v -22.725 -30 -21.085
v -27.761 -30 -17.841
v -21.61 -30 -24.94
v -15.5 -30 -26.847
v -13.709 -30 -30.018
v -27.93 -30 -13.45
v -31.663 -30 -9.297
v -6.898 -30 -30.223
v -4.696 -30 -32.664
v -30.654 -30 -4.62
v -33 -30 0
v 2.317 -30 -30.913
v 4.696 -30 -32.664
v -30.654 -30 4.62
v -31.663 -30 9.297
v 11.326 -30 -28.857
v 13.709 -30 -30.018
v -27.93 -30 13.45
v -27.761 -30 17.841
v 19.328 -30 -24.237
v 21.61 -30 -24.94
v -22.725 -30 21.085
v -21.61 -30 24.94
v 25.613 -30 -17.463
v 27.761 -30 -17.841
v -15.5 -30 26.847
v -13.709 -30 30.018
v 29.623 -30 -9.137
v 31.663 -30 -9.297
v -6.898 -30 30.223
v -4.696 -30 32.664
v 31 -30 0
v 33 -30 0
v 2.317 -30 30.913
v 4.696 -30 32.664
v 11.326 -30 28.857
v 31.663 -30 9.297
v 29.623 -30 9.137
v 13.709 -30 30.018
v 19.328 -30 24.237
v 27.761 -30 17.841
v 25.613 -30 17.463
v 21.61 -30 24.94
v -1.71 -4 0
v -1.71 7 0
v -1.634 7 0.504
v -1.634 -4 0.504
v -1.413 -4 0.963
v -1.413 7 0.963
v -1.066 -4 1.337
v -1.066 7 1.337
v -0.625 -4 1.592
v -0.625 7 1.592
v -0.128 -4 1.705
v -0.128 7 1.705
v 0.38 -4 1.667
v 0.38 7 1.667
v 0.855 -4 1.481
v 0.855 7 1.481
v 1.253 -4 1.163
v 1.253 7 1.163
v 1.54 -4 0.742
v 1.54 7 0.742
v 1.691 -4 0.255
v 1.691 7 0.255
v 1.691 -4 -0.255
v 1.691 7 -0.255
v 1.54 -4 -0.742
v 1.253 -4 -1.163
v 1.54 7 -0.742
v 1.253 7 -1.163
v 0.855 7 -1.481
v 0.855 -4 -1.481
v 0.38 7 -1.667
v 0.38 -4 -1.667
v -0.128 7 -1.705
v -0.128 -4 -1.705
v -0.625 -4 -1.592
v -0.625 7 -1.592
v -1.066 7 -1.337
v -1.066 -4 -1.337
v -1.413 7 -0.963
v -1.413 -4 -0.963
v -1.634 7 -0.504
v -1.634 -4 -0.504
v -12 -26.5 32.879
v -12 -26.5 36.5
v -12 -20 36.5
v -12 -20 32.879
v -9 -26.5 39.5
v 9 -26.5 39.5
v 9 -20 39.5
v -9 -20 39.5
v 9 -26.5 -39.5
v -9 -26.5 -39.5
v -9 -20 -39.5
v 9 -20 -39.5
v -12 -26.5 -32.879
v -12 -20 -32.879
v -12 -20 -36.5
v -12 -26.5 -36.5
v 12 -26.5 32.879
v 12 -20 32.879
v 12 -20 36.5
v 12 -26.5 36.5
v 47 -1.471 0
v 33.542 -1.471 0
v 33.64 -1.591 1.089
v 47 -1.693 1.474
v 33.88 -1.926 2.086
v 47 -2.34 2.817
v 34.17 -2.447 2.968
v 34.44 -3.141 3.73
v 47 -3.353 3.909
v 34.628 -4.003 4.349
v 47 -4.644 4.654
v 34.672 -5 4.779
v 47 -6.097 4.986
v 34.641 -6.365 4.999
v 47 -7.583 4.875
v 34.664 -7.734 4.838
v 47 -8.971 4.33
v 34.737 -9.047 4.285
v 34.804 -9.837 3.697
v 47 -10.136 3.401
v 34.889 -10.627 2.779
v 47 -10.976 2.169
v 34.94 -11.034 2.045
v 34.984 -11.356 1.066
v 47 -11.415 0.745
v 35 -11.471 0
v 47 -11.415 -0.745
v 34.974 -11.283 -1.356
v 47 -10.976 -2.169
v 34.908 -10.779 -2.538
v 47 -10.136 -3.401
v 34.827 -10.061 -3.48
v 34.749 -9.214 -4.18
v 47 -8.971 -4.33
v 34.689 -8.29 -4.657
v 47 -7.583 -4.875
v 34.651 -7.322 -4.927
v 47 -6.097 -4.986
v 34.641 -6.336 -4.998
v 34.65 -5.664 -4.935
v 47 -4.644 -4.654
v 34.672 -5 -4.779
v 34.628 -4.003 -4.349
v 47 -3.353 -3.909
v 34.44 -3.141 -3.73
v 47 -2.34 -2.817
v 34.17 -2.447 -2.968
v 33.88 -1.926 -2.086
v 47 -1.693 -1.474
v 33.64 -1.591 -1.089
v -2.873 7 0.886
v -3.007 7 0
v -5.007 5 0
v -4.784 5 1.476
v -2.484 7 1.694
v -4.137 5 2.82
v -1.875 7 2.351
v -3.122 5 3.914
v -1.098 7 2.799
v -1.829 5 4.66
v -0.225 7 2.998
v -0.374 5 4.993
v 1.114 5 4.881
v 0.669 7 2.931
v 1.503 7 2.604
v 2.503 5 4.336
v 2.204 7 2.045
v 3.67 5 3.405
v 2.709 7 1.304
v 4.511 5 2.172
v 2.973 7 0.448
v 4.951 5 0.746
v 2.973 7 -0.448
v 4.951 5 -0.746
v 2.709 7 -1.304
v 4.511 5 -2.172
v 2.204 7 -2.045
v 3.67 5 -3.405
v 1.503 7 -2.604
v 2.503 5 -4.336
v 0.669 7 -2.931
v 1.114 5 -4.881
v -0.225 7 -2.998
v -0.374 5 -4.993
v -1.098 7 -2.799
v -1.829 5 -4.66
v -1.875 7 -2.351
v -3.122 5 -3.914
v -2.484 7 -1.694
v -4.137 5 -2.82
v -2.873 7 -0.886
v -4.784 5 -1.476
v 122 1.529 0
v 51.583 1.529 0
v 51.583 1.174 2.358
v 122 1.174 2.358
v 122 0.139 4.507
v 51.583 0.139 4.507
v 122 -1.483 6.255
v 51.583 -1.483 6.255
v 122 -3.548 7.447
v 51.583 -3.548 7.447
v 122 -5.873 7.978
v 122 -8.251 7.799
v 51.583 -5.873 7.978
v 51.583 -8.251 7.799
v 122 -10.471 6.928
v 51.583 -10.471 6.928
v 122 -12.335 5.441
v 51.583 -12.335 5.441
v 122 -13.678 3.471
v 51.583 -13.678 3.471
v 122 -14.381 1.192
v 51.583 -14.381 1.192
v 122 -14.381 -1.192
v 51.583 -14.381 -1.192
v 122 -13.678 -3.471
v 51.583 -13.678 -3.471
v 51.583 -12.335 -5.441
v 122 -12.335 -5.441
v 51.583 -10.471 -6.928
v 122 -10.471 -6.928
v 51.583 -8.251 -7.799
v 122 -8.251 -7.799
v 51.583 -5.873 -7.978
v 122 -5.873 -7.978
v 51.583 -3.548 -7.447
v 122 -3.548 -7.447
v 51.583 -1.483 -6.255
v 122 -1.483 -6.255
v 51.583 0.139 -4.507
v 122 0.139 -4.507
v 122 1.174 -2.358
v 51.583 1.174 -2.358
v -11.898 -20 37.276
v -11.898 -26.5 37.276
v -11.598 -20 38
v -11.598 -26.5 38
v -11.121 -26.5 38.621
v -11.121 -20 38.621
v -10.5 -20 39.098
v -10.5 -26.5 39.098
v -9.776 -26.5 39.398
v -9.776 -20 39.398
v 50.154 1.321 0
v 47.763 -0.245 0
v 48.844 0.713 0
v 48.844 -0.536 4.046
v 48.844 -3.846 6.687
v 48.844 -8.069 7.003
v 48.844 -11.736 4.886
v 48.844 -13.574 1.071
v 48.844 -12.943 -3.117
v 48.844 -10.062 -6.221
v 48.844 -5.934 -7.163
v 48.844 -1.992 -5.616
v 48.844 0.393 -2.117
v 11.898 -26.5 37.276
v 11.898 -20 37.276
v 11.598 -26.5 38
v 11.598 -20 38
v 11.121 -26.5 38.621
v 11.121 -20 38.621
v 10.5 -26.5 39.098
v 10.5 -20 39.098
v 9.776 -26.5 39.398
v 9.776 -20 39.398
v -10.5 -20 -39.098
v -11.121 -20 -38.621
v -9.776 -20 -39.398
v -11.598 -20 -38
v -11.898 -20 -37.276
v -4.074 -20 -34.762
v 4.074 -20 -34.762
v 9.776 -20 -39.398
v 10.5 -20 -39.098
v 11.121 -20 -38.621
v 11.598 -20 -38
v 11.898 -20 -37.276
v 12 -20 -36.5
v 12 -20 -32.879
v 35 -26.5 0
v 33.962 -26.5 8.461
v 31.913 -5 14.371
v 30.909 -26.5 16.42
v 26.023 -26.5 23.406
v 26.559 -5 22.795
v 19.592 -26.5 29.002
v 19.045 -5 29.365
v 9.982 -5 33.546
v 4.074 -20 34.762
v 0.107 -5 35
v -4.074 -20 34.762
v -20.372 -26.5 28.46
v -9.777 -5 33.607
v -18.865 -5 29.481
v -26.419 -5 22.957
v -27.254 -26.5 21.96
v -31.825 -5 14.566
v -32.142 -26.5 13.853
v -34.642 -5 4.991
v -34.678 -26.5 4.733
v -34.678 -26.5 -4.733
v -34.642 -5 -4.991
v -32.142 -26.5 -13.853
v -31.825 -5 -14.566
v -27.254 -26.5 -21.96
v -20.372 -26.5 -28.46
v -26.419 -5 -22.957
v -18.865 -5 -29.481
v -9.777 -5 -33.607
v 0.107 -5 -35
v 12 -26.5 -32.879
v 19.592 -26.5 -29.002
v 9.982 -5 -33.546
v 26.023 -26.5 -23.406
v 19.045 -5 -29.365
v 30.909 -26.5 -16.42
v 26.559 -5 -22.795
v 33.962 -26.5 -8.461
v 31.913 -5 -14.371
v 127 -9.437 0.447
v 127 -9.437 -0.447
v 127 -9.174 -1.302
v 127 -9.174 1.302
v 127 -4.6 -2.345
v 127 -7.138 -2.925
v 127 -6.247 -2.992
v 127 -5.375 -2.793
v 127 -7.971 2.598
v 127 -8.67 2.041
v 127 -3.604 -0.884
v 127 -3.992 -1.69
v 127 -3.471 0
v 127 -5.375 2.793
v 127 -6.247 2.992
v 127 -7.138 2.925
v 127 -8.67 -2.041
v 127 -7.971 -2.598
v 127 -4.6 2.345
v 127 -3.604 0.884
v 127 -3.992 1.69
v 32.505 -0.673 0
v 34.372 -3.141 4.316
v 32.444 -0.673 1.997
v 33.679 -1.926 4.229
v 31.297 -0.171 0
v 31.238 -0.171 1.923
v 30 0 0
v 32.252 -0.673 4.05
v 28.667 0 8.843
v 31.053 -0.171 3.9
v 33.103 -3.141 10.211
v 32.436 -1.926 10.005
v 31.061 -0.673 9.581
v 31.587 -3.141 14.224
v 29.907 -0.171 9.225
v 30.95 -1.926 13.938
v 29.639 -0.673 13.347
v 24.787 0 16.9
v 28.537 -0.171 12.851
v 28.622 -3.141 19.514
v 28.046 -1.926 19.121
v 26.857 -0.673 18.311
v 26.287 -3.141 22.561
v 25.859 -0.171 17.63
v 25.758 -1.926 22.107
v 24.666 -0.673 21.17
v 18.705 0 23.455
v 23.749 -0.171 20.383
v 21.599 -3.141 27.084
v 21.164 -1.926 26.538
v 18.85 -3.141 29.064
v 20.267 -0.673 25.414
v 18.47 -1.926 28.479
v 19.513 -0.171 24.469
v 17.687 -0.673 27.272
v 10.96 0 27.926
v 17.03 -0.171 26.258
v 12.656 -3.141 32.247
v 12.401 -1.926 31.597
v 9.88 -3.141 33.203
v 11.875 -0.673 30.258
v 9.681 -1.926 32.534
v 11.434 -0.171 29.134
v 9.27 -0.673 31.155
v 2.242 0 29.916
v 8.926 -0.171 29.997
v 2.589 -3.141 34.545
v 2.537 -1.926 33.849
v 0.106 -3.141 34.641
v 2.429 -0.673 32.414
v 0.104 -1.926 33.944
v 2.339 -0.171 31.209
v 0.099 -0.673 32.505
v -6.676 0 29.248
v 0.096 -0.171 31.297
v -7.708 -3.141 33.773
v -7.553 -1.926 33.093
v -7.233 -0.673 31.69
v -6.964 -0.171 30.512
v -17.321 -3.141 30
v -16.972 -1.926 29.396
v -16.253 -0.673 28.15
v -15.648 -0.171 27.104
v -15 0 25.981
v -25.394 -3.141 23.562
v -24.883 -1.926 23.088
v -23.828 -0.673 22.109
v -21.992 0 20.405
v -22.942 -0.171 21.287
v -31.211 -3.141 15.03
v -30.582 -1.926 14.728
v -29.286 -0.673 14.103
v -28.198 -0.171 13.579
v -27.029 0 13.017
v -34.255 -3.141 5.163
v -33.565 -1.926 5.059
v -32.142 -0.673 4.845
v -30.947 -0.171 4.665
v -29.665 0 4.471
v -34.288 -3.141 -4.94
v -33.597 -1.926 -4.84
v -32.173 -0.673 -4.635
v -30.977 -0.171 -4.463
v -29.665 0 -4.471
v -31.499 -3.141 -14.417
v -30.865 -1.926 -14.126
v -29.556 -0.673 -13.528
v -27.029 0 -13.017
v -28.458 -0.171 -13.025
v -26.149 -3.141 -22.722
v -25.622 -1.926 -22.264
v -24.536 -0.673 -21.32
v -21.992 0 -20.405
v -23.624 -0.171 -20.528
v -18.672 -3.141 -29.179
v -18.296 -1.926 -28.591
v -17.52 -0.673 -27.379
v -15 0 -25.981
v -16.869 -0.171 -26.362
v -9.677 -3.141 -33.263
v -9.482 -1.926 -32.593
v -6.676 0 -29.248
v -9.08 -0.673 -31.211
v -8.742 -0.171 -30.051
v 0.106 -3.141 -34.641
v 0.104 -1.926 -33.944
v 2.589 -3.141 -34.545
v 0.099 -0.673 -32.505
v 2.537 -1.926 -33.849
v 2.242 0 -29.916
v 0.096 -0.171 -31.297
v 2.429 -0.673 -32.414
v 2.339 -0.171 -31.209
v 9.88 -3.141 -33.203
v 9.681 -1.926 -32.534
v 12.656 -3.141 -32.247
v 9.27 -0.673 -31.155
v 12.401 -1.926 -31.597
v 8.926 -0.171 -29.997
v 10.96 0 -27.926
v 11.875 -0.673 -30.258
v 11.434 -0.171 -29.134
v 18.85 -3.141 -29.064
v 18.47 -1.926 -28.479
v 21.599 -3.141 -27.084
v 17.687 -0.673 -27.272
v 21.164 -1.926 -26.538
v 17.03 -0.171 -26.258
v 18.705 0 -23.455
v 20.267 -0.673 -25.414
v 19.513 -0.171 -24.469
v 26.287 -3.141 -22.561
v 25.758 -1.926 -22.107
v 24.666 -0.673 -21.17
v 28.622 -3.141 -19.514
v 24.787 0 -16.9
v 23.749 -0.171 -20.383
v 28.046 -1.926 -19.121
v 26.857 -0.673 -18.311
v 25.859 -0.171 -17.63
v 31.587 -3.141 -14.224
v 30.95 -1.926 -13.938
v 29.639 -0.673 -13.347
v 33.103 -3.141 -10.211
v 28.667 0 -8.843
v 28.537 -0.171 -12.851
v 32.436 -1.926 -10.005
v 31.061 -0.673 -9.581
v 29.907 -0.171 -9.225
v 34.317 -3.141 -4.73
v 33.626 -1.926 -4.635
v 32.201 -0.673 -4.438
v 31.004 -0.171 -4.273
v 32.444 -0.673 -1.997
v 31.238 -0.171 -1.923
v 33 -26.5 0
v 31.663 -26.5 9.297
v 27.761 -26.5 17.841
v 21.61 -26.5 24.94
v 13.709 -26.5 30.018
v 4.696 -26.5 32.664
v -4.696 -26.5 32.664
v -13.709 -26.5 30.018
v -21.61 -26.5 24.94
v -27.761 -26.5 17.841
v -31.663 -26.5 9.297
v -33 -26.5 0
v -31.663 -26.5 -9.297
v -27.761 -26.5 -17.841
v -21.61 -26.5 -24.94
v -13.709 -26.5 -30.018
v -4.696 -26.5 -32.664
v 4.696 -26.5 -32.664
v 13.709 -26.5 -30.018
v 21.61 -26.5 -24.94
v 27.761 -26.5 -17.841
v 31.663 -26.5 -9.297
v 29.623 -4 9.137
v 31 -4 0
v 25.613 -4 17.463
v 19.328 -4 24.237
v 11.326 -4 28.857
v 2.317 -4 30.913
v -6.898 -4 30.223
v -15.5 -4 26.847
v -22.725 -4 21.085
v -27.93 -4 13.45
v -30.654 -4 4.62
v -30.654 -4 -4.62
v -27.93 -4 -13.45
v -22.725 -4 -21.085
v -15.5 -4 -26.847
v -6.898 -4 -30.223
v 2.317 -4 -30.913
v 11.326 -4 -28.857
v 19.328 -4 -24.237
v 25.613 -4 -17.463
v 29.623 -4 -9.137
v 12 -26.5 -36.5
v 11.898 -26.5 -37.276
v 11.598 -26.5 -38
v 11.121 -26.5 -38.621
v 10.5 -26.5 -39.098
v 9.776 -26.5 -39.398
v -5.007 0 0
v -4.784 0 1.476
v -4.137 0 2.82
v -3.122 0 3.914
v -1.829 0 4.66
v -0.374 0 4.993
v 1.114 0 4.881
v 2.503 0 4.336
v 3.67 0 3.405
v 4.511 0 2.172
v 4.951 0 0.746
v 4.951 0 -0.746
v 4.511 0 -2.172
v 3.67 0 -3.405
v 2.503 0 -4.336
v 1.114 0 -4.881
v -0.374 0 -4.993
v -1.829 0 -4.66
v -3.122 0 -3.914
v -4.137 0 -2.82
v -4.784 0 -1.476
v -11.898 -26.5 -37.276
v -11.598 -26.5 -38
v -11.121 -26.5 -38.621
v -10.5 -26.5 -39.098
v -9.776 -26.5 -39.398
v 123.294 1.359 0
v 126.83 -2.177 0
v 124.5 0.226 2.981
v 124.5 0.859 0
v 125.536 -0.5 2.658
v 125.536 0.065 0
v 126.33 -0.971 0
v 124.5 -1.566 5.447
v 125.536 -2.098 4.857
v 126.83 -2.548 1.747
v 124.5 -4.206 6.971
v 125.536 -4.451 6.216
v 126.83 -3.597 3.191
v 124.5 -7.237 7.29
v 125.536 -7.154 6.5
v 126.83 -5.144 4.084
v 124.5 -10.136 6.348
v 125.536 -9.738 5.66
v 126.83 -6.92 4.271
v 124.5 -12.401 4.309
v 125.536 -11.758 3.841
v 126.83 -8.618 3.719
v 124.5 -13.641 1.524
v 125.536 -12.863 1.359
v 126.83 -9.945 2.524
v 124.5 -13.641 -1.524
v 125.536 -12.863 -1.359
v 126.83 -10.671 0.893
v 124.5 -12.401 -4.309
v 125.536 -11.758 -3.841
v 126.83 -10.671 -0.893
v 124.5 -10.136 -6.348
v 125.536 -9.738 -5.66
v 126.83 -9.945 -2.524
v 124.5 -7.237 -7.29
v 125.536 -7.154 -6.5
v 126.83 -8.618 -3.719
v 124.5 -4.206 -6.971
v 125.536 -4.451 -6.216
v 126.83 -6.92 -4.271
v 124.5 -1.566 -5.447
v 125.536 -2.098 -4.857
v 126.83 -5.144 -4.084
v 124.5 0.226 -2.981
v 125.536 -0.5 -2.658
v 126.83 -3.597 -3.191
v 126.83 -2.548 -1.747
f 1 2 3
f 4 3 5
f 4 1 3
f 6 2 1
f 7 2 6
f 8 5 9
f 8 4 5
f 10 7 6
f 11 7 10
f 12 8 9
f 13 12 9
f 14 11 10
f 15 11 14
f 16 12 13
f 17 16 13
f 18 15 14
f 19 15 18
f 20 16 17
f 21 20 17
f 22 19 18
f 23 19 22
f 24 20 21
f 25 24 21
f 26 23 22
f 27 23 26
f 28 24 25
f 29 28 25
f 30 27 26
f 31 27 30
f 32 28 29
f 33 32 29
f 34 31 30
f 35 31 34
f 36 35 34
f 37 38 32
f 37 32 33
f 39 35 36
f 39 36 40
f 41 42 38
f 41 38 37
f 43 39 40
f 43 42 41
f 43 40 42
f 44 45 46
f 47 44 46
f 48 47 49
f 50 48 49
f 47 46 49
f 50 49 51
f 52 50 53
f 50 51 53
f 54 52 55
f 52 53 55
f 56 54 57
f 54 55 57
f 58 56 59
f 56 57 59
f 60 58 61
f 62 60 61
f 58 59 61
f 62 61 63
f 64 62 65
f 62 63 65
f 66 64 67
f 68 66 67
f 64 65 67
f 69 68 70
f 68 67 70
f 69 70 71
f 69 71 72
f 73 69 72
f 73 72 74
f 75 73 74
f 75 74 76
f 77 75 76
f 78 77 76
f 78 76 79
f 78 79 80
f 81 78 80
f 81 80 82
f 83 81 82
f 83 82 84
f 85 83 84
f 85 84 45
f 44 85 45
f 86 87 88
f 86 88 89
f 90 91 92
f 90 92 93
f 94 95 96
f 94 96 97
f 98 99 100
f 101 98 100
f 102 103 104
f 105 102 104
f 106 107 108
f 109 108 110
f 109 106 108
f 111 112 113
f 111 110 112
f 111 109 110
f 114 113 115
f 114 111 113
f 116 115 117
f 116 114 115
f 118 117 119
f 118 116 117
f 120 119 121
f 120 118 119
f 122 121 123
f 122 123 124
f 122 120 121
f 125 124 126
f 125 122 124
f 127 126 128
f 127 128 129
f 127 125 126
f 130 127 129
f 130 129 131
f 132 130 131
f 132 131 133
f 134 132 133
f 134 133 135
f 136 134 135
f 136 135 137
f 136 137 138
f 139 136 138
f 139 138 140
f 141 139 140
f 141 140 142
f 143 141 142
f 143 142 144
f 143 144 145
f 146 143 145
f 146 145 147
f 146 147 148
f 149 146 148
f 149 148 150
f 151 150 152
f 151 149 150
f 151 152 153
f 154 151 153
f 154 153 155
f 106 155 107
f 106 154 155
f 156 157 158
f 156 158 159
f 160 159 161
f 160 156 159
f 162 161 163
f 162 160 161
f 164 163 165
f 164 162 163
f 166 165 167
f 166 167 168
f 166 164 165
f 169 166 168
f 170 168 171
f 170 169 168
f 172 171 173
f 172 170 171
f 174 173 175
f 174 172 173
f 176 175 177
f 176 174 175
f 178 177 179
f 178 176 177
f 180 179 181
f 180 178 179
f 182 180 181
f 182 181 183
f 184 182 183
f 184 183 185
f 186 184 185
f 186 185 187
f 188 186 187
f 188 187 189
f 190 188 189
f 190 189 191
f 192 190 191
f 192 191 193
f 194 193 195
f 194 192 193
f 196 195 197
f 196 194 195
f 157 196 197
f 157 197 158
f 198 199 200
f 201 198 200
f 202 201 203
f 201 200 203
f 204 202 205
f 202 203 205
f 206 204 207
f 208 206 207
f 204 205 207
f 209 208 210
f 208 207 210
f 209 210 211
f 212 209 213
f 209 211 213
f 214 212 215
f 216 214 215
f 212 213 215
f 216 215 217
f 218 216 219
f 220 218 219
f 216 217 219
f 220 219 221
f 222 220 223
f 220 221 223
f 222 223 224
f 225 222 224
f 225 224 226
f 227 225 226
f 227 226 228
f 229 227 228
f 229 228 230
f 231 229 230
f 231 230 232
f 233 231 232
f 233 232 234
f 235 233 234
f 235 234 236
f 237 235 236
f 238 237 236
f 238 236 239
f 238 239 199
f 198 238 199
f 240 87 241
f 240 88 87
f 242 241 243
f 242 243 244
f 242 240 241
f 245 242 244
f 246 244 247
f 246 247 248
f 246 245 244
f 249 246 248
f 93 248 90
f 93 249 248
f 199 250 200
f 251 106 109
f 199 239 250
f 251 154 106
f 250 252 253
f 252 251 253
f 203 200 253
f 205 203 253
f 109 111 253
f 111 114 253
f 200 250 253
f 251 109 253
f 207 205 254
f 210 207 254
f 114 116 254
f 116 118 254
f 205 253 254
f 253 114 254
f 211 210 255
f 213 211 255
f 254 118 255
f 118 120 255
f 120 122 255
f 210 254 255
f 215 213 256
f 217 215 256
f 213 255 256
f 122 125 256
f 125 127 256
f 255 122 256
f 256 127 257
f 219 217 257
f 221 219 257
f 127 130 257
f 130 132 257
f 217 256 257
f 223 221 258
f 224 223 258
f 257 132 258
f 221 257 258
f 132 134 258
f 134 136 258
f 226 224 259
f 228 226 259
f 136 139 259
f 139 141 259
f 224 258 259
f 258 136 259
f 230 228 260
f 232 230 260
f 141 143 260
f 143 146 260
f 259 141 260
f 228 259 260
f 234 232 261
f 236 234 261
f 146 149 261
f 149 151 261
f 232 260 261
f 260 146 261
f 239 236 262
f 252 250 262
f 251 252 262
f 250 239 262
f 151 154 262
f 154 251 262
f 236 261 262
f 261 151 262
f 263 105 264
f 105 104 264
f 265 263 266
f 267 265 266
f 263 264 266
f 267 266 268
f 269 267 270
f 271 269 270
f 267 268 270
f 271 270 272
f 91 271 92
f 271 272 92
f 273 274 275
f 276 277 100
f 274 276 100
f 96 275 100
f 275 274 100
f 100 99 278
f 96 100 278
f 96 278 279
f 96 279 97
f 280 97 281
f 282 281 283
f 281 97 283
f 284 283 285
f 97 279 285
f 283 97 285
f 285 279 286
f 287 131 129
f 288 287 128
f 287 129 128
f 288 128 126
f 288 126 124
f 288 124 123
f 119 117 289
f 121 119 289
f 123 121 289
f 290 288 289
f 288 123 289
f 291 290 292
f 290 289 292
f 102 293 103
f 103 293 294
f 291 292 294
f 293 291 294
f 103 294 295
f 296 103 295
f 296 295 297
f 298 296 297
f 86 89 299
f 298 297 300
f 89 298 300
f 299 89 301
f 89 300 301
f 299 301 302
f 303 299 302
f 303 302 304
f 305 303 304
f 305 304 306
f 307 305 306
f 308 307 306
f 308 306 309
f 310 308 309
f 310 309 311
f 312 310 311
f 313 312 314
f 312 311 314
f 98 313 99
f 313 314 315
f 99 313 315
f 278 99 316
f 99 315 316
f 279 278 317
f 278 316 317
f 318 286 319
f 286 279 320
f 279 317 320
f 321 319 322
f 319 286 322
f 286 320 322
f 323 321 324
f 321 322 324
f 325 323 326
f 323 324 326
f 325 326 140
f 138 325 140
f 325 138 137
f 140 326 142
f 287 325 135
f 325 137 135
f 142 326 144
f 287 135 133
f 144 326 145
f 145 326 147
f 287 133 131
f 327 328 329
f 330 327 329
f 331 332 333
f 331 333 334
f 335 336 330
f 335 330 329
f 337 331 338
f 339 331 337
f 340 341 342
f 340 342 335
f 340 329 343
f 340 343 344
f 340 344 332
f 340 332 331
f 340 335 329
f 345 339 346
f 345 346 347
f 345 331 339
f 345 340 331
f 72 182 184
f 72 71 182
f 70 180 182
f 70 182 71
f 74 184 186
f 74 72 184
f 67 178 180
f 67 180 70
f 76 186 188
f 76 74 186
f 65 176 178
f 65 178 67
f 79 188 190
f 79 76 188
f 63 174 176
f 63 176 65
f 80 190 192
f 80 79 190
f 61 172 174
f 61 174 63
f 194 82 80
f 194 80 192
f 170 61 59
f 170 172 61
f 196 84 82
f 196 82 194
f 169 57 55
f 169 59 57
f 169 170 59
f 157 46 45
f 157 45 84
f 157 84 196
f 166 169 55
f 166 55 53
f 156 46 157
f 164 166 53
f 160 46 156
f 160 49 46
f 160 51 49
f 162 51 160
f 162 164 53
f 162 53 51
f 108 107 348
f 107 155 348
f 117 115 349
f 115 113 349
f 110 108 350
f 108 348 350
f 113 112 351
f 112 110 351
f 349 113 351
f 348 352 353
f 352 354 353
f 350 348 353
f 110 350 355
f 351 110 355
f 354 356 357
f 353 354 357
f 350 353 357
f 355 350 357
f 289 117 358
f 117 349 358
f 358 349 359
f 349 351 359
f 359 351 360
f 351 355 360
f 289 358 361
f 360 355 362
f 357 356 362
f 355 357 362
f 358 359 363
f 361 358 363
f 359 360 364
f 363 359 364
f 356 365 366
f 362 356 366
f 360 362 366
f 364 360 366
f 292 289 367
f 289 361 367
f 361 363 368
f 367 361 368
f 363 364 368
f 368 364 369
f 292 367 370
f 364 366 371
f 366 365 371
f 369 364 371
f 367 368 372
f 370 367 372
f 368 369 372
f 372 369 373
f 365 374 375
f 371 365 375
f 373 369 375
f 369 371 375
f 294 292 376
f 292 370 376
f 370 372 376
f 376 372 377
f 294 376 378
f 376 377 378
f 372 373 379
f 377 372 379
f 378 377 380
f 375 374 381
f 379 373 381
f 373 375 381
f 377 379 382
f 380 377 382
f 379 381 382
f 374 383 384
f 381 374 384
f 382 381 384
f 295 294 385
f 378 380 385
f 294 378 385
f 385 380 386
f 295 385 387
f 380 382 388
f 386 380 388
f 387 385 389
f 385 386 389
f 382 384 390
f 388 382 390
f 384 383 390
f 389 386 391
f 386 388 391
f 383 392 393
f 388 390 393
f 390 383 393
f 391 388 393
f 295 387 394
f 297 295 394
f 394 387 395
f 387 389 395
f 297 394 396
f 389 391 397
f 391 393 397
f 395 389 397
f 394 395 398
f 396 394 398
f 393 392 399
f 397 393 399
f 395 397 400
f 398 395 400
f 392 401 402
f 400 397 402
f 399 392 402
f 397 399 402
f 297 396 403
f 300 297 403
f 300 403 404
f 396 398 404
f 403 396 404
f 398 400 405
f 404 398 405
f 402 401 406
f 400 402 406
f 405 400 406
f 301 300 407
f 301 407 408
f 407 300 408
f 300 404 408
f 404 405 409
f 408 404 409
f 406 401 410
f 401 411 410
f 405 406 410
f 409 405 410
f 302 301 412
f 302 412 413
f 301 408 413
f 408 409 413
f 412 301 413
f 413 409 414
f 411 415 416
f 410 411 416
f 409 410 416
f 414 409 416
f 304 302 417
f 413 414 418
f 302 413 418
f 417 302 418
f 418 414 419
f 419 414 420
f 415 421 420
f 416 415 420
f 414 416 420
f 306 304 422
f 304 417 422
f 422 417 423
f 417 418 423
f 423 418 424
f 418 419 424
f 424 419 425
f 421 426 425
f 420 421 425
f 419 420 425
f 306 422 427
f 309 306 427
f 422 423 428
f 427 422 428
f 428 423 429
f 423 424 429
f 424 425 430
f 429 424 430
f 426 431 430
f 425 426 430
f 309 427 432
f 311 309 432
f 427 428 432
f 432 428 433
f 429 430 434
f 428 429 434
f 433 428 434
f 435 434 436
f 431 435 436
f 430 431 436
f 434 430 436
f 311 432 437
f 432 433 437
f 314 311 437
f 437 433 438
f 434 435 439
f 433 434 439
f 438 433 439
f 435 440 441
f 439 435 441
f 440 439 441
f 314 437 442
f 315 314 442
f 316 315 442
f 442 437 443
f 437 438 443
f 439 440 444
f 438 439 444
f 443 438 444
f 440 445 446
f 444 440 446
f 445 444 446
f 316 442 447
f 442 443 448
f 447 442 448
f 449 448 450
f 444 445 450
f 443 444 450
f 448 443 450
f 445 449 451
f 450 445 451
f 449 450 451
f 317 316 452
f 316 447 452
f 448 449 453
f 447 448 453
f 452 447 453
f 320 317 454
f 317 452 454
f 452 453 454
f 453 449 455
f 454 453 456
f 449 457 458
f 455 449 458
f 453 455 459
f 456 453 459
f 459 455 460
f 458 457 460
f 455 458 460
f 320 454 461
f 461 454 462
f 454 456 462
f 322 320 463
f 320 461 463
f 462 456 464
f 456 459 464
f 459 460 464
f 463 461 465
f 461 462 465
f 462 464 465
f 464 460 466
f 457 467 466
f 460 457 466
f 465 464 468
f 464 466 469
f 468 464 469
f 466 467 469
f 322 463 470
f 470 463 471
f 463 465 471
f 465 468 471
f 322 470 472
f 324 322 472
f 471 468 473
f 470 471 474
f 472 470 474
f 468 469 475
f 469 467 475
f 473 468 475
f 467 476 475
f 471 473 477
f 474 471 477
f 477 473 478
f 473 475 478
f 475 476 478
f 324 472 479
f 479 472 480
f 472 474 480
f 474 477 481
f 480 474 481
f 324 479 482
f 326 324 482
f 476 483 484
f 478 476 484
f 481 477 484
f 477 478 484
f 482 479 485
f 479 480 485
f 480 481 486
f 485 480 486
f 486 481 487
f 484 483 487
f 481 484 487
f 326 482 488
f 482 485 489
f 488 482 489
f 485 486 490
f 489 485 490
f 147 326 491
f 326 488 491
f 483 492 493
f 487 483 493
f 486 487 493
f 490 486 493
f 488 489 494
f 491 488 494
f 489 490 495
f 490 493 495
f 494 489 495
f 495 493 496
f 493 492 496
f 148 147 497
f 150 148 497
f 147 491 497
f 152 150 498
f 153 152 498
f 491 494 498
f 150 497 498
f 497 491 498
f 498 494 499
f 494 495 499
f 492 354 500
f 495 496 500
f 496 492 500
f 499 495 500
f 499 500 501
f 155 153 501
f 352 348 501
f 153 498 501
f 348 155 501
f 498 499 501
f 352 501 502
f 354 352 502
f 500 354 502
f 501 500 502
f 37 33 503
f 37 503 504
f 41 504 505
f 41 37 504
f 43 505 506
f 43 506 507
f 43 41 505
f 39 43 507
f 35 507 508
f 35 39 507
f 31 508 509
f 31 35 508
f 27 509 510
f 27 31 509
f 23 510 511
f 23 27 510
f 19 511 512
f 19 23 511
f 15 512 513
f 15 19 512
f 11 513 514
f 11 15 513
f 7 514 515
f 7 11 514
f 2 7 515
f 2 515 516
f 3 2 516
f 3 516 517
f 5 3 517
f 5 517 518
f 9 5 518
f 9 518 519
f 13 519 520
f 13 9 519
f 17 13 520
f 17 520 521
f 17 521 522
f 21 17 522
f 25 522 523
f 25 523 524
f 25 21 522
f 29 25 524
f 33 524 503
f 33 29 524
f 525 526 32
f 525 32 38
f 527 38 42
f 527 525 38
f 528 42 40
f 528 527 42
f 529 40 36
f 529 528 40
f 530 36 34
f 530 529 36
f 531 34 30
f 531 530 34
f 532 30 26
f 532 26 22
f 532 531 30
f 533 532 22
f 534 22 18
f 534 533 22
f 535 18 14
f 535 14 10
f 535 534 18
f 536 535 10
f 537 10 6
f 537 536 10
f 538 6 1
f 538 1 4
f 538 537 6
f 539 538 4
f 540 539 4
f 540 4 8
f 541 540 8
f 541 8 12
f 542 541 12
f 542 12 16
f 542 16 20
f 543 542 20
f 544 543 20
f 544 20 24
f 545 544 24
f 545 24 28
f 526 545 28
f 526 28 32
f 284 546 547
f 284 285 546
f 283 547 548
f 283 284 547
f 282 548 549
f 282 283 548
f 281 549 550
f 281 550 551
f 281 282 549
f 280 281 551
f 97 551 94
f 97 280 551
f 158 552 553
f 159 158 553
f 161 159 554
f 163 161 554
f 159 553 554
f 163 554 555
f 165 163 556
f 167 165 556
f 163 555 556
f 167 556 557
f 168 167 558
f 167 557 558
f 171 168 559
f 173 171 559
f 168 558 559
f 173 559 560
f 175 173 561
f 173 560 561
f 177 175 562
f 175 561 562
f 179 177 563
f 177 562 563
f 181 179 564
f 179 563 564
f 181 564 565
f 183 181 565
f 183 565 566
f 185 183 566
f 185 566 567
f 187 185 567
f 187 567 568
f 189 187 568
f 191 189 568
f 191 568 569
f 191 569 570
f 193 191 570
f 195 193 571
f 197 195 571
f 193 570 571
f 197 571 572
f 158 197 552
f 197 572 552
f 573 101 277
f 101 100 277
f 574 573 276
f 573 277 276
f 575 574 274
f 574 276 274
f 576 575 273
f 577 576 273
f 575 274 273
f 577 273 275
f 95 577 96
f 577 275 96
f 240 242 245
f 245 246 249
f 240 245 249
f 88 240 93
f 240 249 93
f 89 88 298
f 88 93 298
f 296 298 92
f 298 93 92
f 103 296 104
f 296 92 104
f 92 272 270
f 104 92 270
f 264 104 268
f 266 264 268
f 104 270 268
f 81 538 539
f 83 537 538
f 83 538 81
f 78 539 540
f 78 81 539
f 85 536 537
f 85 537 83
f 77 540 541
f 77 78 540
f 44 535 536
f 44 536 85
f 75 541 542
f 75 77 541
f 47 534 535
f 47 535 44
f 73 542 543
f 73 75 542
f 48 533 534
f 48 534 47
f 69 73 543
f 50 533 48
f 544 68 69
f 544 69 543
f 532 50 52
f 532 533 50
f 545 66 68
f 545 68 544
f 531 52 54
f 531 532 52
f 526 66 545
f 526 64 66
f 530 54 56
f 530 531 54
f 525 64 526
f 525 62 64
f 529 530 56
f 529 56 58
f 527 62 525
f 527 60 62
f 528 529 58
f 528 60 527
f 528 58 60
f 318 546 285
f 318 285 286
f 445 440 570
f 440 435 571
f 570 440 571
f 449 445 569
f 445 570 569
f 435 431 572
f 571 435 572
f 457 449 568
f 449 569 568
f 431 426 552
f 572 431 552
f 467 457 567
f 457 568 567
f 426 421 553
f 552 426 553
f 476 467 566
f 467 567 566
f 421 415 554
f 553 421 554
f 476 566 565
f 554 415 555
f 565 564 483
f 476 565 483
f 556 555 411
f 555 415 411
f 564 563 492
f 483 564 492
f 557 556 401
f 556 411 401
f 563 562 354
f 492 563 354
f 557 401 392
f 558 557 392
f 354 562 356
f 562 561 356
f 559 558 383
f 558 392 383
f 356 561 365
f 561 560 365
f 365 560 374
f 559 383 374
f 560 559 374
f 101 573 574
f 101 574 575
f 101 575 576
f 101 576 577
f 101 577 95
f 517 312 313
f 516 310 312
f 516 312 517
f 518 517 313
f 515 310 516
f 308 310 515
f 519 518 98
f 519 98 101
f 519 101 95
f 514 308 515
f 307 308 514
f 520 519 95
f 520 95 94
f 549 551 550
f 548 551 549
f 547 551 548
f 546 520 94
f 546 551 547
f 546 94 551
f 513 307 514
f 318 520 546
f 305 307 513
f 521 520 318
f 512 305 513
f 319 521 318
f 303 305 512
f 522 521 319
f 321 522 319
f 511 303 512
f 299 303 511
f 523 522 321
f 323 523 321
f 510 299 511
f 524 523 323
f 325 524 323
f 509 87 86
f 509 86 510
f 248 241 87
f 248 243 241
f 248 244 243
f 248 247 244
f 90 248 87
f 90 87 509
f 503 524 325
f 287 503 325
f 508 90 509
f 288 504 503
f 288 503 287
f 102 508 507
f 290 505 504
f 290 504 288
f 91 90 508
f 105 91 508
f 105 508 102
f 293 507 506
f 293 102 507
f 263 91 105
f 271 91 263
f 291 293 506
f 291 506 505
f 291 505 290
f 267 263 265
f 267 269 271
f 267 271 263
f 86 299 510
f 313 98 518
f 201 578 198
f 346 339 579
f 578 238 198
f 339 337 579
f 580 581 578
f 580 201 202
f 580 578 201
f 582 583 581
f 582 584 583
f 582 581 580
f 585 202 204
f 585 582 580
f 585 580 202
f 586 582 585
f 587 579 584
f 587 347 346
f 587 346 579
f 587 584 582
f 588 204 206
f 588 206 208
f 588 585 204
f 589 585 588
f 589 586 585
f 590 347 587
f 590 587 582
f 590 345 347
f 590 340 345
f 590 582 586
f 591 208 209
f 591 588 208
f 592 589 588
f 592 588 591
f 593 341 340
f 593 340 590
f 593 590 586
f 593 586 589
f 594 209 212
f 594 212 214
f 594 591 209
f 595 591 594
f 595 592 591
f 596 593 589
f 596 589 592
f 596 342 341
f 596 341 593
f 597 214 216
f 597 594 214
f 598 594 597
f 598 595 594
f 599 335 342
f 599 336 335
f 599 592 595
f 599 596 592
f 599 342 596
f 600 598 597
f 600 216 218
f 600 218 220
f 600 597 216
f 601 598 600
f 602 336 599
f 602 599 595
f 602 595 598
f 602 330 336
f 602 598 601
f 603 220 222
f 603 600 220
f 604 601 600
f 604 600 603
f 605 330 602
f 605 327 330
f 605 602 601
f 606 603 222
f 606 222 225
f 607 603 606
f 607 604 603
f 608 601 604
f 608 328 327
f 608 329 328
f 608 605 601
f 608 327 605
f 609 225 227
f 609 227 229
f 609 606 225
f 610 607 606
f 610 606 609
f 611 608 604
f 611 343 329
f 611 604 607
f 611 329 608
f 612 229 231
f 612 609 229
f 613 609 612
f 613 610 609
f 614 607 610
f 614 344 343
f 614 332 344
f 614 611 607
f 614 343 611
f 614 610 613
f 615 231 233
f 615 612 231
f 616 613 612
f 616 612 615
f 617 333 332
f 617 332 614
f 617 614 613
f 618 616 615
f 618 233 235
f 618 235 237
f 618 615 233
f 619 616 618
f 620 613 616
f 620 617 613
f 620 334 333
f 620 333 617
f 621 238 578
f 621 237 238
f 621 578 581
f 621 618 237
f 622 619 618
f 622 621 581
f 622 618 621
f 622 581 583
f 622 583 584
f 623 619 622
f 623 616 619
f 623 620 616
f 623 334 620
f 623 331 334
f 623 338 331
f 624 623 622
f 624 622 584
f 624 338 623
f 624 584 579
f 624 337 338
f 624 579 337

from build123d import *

# Parameters (mm, degrees)
F0_R      = 35
F1_DEPTH  = 30
F2_T      = -4
F3_R      = 5
F5_R      = 5
F7_R      = 8
F7_R_2    = 5
F8_DEPTH  = 80
F9_R      = 5.0065220345
F10_DEPTH = 7
F11_SIZE  = 2
F14_DEPTH = 6.5
F15_R     = 5
F17_R     = 35
F17_R_2   = 33
F18_DEPTH = 3.5
F19_R     = 3
F20_R     = 1.7097163671
F21_DEPTH = 37.001


# Not quite as in the source:
# - a fillet or chamfer that OpenCascade refuses, or shapes differently, is made with other operations: its cross-section is extruded or revolved along the edge and cut away or added


with BuildPart() as f1:
    # F0 (on Front) → F1 (new body)
    with BuildSketch(Plane.XZ):
        Circle(F0_R)
    extrude(amount=F1_DEPTH)

    # F2
    f2_openings = [f1.faces().sort_by_distance(p)[0] for p in [
        (0, -30, 0),
    ]]
    offset(amount=F2_T, openings=f2_openings)

    # F3
    f3_edges = [f1.edges().sort_by_distance(p)[0] for p in [
        (-35, 0, 0),
    ]]
    fillet(f3_edges, radius=F3_R)

    # F5 (on offset) → F6 (join, up to the next surface of F1)
    with BuildSketch(Plane.YZ.offset(47)):
        with Locations((-6.4707305679, 0)):
            Circle(F5_R)
    extrude(until=Until.NEXT, dir=(-1, 0, 0))

    # F7 (on face) → F8 (join)
    with BuildSketch(Plane.YZ.offset(47)):
        with Locations((-6.4707305679, 0)):
            Circle(F7_R)
        with Locations((-6.4707305679, 0)):
            Circle(F7_R_2, mode=Mode.SUBTRACT)
        with Locations((-6.4707305679, 0)):
            Circle(F7_R_2)
    extrude(amount=F8_DEPTH)

    # F9 (on face) → F10 (join)
    with BuildSketch(Plane(origin=(0, 0, 0), x_dir=(-1, 0, 0), z_dir=(0, 1, 0))):
        Circle(F9_R)
    extrude(amount=F10_DEPTH)

    # F11
    f11_edges = [f1.edges().sort_by_distance(p)[0] for p in [
        (5.006522, 7, 0),
    ]]
    chamfer(f11_edges, length=F11_SIZE)

    # F13 (on offset) → F14 (join)
    with BuildSketch(Plane.XZ.offset(26.5)):
        with BuildLine():
            Line((-12, -39.5), (12, -39.5))
            Line((12, -39.5), (12, -32.8785644455))
            ThreePointArc((12, -32.8785644455), (0, -35), (-12, -32.8785644455))
            Line((-12, -32.8785644455), (-12, -39.5))
        make_face()
        with BuildLine():
            ThreePointArc((-12, 32.8785644455), (0, 35), (12, 32.8785644455))
            Line((12, 32.8785644455), (12, 39.5))
            Line((12, 39.5), (-12, 39.5))
            Line((-12, 39.5), (-12, 32.8785644455))
        make_face()
    extrude(amount=-F14_DEPTH)

    # F15
    f15_edges = [f1.edges().sort_by_distance(p)[0] for p in [
        (127, -14.470731, 0),
    ]]
    fillet(f15_edges, radius=F15_R)

    # F16: fillet of radius 5 on 1 edges, made by hand

    # F16_s1 → F16_t2 (revolve, cut)
    with BuildSketch(Plane.XY):
        with BuildLine():
            ThreePointArc((51.582575695, 1.5292694321), (48.8439629074, 0.7125695648), (47, -1.4707305679))
            Line((47, -1.4707305679), (47, 1.5292694321))
            Line((47, 1.5292694321), (51.582575695, 1.5292694321))
        make_face()
    revolve(axis=Axis((47, -6.4707305679, 0), (1, 0, 0)), mode=Mode.SUBTRACT)

    # F17 (on face) → F18 (cut, through all)
    with BuildSketch(Plane.XZ.offset(30)):
        Circle(F17_R)
        Circle(F17_R_2, mode=Mode.SUBTRACT)
    extrude(amount=-F18_DEPTH, mode=Mode.SUBTRACT)

    # F19
    f19_edges = [f1.edges().sort_by_distance(p)[0] for p in [
        (12, -23.25, 39.5),
        (-12, -23.25, 39.5),
        (-12, -23.25, -39.5),
        (12, -23.25, -39.5),
    ]]
    fillet(f19_edges, radius=F19_R)

    # F20 (on face) → F21 (cut, through all)
    with BuildSketch(Plane(origin=(0, 7, 0), x_dir=(-1, 0, 0), z_dir=(0, 1, 0))):
        Circle(F20_R)
    extrude(amount=-F21_DEPTH, mode=Mode.SUBTRACT)


solid = f1.part
